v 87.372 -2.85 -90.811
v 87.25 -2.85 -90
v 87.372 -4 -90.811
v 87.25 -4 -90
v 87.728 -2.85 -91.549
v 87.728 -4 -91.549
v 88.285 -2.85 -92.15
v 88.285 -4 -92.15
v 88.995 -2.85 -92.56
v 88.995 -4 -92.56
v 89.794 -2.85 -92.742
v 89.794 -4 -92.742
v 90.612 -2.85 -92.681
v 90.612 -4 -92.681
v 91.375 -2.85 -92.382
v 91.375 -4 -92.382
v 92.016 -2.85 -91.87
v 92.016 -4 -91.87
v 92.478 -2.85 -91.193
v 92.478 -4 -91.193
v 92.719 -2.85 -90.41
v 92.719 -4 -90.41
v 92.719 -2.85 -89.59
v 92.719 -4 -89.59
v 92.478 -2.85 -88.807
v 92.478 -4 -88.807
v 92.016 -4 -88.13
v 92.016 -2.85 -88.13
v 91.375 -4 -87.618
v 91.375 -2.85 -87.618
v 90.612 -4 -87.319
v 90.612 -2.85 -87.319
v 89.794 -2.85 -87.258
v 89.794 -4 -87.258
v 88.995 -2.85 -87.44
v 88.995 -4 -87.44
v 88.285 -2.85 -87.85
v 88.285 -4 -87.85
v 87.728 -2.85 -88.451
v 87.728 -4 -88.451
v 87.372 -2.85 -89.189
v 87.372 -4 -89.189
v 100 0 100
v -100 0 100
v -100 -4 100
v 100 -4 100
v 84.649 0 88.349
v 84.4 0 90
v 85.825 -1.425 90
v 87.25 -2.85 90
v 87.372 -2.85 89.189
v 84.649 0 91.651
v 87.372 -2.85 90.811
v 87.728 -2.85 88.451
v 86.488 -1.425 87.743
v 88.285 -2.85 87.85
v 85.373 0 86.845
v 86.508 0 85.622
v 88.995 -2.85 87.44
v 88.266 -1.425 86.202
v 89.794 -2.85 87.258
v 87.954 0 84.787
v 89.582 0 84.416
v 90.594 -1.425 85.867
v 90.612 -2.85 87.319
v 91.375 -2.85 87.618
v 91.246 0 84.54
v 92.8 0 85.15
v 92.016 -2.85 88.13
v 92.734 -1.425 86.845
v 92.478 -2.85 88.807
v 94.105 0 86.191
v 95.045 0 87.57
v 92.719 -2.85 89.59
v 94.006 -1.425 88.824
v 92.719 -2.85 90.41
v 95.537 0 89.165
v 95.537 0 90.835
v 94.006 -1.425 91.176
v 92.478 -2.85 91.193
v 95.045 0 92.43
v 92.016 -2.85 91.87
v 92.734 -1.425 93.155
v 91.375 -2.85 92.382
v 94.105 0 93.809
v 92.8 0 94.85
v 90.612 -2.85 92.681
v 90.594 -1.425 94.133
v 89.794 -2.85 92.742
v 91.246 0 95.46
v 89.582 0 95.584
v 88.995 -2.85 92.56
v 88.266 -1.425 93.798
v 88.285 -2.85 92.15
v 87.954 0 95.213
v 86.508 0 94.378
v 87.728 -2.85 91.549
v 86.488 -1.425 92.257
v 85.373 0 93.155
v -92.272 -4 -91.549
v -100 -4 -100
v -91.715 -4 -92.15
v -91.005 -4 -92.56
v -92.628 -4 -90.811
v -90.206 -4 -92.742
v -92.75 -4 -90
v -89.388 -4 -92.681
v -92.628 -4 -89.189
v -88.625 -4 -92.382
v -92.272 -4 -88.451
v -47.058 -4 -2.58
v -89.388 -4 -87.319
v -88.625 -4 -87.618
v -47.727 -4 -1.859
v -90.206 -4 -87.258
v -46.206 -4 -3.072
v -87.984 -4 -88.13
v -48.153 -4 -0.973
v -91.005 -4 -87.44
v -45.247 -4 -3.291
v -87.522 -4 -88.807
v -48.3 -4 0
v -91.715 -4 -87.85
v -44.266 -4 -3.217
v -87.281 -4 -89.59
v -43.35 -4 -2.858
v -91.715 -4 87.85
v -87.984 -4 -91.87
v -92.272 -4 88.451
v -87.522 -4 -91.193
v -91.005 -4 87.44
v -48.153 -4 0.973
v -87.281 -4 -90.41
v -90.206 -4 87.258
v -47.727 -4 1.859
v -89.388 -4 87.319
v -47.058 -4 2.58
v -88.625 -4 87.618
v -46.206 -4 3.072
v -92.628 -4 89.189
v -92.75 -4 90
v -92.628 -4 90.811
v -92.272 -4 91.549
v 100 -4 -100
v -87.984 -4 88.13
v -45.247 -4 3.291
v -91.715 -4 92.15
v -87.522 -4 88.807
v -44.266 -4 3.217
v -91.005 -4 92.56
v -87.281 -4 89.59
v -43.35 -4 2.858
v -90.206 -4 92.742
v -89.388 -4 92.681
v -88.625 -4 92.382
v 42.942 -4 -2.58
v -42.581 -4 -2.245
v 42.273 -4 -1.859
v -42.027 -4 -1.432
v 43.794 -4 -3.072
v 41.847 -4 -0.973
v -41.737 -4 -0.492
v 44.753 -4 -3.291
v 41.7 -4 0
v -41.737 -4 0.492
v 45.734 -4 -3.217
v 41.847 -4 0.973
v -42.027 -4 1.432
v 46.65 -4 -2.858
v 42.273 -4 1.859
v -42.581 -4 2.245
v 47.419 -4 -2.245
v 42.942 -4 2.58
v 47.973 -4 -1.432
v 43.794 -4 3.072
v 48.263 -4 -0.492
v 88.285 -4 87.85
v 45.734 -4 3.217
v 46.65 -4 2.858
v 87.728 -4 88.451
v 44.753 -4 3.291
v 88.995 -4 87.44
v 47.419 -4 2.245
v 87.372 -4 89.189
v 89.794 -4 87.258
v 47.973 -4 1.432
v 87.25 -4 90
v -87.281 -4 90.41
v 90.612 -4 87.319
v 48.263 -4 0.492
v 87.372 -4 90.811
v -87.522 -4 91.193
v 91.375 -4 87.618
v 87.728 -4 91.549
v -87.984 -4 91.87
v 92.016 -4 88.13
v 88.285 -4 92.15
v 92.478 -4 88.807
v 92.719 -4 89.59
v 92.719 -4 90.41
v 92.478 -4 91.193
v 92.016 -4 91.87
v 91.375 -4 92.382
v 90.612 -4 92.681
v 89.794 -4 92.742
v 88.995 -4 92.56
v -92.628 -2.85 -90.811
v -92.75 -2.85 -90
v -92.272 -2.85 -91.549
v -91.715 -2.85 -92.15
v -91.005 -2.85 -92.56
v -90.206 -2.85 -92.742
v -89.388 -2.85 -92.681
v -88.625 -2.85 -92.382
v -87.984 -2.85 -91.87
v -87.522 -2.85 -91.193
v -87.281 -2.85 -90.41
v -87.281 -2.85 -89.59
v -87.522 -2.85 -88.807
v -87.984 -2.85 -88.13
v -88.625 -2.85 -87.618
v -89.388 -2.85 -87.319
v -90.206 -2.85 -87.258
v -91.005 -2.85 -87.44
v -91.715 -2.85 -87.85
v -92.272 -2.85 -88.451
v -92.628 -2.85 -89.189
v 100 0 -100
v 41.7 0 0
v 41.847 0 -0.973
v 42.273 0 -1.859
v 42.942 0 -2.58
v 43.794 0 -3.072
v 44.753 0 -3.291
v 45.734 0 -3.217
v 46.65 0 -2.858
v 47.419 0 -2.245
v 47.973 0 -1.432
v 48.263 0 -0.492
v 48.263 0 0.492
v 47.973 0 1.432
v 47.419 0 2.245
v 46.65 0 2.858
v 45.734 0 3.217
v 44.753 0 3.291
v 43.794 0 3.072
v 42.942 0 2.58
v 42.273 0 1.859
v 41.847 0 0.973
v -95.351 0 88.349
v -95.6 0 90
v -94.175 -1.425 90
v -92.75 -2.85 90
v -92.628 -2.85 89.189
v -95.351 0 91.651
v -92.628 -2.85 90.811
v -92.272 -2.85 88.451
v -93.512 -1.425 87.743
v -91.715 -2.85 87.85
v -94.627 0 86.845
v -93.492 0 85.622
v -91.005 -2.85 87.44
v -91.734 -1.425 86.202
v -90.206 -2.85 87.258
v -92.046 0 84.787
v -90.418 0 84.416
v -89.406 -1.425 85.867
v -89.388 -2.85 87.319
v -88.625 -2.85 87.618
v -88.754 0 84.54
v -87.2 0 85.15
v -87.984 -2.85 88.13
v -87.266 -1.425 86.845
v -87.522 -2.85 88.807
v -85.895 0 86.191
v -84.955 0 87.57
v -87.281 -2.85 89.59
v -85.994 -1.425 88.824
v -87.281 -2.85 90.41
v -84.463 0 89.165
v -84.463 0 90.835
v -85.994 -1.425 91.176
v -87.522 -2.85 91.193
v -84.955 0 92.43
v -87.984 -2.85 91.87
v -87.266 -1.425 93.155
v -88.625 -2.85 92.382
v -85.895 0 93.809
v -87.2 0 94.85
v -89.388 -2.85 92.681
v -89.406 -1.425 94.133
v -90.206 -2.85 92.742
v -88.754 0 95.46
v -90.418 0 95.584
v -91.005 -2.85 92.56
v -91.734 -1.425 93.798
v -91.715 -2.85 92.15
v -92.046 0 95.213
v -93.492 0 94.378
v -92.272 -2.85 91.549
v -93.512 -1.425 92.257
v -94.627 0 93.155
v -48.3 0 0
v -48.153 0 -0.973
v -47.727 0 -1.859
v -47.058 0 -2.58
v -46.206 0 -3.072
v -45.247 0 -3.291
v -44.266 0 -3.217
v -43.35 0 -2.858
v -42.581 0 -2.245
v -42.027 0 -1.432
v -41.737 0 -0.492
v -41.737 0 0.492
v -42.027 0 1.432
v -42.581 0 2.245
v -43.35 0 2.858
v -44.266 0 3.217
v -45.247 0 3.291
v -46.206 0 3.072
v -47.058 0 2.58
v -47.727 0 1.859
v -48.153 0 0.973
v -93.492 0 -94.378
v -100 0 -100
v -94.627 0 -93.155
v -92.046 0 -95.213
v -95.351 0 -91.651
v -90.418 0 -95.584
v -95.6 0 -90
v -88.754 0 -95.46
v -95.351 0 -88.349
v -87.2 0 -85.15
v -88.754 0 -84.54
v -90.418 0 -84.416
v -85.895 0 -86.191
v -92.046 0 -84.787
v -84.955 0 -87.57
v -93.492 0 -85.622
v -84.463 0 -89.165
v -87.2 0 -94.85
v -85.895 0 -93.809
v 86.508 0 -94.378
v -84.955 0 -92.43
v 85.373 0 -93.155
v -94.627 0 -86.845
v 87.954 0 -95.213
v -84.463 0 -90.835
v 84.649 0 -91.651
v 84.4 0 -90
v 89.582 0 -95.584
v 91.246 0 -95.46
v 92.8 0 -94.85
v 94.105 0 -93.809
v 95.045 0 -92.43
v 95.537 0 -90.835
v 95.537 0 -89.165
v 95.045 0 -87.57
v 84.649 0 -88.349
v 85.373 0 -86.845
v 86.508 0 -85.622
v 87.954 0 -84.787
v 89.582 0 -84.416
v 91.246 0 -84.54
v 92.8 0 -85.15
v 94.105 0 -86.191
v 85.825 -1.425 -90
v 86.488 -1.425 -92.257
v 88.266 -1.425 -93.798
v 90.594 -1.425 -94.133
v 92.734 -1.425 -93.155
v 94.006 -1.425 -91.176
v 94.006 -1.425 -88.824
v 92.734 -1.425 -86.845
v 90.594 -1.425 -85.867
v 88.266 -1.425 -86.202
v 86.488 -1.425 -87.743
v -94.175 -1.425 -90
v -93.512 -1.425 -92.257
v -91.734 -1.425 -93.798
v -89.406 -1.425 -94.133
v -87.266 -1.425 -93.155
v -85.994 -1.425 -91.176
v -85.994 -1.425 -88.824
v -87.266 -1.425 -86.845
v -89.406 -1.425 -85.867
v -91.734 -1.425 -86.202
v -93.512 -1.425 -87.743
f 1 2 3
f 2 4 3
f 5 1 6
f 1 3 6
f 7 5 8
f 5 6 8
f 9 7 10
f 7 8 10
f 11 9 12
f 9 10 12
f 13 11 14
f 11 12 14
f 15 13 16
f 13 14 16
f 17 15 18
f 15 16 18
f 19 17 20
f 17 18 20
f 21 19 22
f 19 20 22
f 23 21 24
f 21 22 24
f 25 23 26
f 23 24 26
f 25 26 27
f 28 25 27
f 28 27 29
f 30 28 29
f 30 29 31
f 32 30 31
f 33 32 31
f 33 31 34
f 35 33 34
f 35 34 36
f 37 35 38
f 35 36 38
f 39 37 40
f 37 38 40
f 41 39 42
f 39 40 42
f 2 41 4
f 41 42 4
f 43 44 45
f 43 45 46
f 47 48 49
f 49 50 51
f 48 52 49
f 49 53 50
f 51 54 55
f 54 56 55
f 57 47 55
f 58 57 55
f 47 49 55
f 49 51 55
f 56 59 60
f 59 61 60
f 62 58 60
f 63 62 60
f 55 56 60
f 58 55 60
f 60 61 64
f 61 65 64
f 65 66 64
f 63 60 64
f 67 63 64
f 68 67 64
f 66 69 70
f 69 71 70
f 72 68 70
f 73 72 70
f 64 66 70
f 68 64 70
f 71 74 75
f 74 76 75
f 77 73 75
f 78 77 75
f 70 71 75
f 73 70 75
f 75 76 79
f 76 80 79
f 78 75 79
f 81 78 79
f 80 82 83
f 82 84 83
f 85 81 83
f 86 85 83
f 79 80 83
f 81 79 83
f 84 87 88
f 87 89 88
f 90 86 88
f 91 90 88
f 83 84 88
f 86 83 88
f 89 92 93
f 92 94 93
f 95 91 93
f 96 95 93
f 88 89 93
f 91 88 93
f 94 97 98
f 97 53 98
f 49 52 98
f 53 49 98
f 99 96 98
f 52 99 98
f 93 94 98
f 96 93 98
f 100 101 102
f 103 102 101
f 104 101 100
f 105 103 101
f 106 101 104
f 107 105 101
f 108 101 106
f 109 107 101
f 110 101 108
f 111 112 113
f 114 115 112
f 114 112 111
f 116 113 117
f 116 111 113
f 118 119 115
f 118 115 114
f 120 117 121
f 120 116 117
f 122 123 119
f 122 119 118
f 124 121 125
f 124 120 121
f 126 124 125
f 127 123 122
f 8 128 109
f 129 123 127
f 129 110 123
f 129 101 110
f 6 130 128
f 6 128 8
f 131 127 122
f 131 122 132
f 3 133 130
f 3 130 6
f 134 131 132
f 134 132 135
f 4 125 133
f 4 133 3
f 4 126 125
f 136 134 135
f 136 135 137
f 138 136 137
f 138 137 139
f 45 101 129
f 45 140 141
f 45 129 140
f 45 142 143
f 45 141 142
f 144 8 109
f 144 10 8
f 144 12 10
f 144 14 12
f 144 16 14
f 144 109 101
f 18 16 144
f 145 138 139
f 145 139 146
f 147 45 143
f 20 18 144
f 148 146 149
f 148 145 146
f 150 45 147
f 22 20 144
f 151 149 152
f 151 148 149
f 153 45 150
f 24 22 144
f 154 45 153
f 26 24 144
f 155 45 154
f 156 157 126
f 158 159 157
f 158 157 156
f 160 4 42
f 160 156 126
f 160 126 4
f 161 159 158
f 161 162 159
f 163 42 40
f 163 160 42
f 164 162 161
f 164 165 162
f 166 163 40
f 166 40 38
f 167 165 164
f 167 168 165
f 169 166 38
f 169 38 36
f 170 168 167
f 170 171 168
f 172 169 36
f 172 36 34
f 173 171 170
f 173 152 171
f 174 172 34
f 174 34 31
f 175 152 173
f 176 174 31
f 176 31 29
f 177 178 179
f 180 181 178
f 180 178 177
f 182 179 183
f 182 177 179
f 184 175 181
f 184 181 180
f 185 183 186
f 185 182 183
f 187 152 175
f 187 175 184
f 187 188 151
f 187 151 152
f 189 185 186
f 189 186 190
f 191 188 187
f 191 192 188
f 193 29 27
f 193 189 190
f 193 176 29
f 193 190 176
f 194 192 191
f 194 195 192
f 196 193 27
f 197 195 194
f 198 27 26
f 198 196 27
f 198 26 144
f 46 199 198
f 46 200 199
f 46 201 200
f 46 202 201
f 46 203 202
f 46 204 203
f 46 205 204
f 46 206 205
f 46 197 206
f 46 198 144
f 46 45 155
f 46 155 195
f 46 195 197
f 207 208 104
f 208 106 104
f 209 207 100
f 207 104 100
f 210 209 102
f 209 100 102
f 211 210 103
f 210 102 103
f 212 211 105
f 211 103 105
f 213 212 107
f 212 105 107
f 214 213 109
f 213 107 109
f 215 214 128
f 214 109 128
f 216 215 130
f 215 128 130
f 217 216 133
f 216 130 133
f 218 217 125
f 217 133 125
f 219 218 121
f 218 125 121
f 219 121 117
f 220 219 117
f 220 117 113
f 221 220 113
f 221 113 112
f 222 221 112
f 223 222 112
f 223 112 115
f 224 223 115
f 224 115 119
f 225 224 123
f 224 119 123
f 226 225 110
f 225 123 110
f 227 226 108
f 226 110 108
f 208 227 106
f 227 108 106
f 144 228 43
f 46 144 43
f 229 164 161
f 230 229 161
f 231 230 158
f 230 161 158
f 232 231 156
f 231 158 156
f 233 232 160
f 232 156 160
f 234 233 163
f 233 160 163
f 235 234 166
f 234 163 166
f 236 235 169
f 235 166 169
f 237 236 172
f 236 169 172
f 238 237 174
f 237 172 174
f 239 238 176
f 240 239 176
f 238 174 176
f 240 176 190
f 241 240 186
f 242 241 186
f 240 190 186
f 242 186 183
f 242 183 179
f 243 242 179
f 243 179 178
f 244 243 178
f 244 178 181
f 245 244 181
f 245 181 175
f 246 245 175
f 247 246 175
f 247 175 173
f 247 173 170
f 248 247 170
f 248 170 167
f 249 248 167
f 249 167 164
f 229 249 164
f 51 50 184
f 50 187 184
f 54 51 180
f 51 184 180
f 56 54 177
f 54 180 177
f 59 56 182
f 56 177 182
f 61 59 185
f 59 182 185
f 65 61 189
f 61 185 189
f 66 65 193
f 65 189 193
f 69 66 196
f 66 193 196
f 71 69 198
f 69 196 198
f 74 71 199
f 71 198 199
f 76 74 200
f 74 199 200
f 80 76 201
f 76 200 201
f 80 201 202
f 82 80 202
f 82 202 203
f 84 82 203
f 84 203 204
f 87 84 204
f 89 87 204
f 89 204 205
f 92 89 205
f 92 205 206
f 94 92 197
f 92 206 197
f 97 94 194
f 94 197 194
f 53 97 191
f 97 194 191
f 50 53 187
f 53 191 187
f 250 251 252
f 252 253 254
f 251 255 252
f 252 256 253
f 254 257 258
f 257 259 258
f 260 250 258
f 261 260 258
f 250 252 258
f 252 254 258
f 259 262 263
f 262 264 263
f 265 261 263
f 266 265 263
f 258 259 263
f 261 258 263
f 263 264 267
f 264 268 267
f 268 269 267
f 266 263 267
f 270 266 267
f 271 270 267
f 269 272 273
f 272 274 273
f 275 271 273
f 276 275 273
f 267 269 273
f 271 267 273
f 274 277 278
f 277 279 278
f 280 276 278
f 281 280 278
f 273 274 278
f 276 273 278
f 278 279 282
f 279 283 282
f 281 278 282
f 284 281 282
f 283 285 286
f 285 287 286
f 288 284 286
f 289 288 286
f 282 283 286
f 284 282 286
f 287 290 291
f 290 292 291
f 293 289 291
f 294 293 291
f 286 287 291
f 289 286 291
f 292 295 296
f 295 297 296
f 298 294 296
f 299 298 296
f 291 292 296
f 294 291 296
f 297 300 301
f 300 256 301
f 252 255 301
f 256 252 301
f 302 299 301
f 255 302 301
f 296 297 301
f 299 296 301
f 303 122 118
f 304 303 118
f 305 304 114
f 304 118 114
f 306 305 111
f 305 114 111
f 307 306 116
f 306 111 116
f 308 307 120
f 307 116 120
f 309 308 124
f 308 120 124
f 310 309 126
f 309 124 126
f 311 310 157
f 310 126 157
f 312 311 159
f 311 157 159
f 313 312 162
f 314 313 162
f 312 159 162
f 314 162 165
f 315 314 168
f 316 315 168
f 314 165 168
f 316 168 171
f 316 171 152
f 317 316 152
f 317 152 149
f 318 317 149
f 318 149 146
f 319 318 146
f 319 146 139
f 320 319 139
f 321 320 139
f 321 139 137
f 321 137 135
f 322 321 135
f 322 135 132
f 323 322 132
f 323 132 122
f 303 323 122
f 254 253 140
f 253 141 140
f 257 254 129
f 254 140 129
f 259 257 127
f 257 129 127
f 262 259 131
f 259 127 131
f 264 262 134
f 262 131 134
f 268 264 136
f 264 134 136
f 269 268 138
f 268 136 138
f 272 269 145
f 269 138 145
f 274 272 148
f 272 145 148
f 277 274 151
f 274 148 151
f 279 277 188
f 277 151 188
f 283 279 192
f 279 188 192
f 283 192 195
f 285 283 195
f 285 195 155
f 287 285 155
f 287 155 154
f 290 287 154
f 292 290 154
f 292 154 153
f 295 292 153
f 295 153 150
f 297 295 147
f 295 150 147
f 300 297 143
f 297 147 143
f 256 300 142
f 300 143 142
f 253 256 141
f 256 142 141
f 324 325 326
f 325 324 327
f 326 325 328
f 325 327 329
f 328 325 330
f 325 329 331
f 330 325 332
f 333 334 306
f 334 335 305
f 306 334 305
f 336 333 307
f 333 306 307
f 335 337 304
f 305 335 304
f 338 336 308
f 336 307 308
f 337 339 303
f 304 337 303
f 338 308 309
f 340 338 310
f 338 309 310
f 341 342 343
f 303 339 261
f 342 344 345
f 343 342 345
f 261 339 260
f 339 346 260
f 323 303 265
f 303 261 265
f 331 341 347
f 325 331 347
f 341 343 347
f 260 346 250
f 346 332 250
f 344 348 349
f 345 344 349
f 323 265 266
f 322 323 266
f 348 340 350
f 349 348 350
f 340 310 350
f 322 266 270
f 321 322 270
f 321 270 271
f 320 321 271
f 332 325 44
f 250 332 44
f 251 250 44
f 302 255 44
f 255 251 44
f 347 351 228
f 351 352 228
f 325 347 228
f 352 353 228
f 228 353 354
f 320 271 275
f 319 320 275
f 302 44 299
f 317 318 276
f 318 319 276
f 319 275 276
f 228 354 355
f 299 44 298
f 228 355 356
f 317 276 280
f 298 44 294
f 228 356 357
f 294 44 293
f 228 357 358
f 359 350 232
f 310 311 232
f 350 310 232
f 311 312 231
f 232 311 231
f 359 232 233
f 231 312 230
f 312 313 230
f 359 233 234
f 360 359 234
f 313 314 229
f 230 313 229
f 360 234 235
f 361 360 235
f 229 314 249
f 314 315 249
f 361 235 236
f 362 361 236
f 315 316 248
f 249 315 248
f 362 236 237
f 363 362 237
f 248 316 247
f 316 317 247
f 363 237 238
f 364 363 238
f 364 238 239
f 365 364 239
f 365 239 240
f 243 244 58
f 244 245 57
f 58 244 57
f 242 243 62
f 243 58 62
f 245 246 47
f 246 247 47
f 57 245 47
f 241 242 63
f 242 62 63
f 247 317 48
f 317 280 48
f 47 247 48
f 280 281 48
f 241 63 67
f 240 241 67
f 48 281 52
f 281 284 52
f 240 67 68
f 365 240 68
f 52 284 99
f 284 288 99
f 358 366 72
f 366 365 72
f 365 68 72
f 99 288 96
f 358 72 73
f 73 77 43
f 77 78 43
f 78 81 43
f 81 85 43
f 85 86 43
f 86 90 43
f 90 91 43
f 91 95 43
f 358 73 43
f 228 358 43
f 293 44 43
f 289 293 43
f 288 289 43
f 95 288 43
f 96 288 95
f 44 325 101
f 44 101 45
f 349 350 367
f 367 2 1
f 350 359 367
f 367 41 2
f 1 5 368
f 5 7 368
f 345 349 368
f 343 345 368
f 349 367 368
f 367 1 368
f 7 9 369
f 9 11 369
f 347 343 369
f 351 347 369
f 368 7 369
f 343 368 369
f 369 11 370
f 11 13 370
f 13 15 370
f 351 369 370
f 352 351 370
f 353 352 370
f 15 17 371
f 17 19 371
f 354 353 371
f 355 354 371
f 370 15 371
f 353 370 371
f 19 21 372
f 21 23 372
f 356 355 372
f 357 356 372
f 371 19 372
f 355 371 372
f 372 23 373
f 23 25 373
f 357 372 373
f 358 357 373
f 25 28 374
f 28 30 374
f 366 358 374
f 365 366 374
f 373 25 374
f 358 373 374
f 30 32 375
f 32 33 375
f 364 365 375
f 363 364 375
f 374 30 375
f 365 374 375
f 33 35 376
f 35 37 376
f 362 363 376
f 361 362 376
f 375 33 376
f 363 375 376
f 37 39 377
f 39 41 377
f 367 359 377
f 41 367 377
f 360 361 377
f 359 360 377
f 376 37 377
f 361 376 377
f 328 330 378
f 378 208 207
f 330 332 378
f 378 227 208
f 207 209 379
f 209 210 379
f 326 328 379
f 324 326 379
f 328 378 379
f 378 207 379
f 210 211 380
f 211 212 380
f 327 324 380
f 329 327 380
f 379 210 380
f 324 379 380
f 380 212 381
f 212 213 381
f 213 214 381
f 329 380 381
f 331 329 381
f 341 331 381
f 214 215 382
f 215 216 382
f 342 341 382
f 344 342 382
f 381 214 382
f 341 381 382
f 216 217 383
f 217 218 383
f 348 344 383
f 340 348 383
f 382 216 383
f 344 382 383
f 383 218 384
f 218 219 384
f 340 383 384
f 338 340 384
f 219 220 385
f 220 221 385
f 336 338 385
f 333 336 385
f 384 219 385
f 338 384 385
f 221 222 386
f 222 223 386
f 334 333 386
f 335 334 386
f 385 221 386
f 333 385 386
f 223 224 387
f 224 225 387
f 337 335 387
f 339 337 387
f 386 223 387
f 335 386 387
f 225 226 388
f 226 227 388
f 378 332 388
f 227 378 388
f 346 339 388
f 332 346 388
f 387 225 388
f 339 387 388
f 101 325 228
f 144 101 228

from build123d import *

# Parameters (mm, degrees)
F0_W           = 200
F0_H           = 200
F1_DEPTH       = 4
F2_D           = 6.6
F3_D           = 5.5
F3_CSINK_D     = 11.2
F3_CSINK_ANGLE = 90


with BuildPart() as f1:
    # F0 (on Front) → F1 (new body)
    with BuildSketch(Plane.XZ):
        Rectangle(F0_W, F0_H)
    extrude(amount=F1_DEPTH)

    # F2 (through all)
    with Locations(Plane(origin=(0, 0, 0), x_dir=(1, 0, 0), z_dir=(0, 1, 0))):
        with Locations((-45, 0), (45, 0)):
            Hole(F2_D / 2)

    # F3 (through all)
    with Locations(Plane(origin=(0, 0, 0), x_dir=(1, 0, 0), z_dir=(0, 1, 0))):
        with Locations((-90, -90), (90, -90), (-90, 90), (90, 90)):
            CounterSinkHole(F3_D / 2, F3_CSINK_D / 2, counter_sink_angle=F3_CSINK_ANGLE)


solid = f1.part
